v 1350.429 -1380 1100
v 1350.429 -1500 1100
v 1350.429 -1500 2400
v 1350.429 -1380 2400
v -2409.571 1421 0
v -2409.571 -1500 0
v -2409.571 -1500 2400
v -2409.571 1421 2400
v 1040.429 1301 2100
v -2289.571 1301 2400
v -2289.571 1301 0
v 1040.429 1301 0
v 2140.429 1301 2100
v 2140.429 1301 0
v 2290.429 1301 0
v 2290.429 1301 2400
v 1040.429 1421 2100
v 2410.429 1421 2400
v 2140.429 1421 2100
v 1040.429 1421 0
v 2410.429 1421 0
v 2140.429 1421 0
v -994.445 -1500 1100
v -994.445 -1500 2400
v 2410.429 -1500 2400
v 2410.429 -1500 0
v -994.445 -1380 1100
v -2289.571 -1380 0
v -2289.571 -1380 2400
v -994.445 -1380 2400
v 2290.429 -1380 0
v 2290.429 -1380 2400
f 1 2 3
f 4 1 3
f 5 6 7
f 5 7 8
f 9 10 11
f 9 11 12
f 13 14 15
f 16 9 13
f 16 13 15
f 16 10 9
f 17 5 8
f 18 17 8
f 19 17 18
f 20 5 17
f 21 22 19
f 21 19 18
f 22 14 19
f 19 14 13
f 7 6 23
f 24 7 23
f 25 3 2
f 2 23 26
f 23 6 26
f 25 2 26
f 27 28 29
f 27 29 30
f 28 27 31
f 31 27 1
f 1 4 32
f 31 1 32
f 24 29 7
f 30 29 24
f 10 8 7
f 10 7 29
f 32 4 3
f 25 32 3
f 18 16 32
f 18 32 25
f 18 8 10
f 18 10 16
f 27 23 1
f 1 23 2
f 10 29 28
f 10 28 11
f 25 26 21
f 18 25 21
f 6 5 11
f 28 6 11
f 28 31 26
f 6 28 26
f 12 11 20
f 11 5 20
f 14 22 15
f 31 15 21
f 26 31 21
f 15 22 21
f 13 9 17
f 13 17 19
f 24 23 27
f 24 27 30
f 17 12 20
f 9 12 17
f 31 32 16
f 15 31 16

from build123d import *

# Parameters (mm, degrees)
F0_W     = 4820
F0_H     = 2921
F1_DEPTH = 2400
F2_W     = 4580
F2_H     = 2681
F3_DEPTH = 2400.001
F4_W     = 2344.874328
F4_H     = 1300
F5_DEPTH = 120
F6_W     = 1100
F6_H     = 2100
F7_DEPTH = 120


with BuildPart() as f1:
    # F0 (on Top) → F1 (new body)
    with BuildSketch(Plane.XY):
        with Locations((0.429004, -39.5)):
            Rectangle(F0_W, F0_H)
    extrude(amount=F1_DEPTH)

    # F2 (on face) → F3 (cut, through all)
    with BuildSketch(Plane.XY.offset(2400)):
        with Locations((0.429004, -39.5)):
            Rectangle(F2_W, F2_H)
    extrude(amount=-F3_DEPTH, mode=Mode.SUBTRACT)

    # F4 (on face) → F5 (cut, through all)
    with BuildSketch(Plane.XZ.offset(1500)):
        with Locations((177.99184, 1750)):
            Rectangle(F4_W, F4_H)
    extrude(amount=-F5_DEPTH, mode=Mode.SUBTRACT)

    # F6 (on face) → F7 (cut, through all)
    with BuildSketch(Plane.XZ.offset(-1301)):
        with Locations((1590.429004, 1050)):
            Rectangle(F6_W, F6_H)
    extrude(amount=-F7_DEPTH, mode=Mode.SUBTRACT)


solid = f1.part
